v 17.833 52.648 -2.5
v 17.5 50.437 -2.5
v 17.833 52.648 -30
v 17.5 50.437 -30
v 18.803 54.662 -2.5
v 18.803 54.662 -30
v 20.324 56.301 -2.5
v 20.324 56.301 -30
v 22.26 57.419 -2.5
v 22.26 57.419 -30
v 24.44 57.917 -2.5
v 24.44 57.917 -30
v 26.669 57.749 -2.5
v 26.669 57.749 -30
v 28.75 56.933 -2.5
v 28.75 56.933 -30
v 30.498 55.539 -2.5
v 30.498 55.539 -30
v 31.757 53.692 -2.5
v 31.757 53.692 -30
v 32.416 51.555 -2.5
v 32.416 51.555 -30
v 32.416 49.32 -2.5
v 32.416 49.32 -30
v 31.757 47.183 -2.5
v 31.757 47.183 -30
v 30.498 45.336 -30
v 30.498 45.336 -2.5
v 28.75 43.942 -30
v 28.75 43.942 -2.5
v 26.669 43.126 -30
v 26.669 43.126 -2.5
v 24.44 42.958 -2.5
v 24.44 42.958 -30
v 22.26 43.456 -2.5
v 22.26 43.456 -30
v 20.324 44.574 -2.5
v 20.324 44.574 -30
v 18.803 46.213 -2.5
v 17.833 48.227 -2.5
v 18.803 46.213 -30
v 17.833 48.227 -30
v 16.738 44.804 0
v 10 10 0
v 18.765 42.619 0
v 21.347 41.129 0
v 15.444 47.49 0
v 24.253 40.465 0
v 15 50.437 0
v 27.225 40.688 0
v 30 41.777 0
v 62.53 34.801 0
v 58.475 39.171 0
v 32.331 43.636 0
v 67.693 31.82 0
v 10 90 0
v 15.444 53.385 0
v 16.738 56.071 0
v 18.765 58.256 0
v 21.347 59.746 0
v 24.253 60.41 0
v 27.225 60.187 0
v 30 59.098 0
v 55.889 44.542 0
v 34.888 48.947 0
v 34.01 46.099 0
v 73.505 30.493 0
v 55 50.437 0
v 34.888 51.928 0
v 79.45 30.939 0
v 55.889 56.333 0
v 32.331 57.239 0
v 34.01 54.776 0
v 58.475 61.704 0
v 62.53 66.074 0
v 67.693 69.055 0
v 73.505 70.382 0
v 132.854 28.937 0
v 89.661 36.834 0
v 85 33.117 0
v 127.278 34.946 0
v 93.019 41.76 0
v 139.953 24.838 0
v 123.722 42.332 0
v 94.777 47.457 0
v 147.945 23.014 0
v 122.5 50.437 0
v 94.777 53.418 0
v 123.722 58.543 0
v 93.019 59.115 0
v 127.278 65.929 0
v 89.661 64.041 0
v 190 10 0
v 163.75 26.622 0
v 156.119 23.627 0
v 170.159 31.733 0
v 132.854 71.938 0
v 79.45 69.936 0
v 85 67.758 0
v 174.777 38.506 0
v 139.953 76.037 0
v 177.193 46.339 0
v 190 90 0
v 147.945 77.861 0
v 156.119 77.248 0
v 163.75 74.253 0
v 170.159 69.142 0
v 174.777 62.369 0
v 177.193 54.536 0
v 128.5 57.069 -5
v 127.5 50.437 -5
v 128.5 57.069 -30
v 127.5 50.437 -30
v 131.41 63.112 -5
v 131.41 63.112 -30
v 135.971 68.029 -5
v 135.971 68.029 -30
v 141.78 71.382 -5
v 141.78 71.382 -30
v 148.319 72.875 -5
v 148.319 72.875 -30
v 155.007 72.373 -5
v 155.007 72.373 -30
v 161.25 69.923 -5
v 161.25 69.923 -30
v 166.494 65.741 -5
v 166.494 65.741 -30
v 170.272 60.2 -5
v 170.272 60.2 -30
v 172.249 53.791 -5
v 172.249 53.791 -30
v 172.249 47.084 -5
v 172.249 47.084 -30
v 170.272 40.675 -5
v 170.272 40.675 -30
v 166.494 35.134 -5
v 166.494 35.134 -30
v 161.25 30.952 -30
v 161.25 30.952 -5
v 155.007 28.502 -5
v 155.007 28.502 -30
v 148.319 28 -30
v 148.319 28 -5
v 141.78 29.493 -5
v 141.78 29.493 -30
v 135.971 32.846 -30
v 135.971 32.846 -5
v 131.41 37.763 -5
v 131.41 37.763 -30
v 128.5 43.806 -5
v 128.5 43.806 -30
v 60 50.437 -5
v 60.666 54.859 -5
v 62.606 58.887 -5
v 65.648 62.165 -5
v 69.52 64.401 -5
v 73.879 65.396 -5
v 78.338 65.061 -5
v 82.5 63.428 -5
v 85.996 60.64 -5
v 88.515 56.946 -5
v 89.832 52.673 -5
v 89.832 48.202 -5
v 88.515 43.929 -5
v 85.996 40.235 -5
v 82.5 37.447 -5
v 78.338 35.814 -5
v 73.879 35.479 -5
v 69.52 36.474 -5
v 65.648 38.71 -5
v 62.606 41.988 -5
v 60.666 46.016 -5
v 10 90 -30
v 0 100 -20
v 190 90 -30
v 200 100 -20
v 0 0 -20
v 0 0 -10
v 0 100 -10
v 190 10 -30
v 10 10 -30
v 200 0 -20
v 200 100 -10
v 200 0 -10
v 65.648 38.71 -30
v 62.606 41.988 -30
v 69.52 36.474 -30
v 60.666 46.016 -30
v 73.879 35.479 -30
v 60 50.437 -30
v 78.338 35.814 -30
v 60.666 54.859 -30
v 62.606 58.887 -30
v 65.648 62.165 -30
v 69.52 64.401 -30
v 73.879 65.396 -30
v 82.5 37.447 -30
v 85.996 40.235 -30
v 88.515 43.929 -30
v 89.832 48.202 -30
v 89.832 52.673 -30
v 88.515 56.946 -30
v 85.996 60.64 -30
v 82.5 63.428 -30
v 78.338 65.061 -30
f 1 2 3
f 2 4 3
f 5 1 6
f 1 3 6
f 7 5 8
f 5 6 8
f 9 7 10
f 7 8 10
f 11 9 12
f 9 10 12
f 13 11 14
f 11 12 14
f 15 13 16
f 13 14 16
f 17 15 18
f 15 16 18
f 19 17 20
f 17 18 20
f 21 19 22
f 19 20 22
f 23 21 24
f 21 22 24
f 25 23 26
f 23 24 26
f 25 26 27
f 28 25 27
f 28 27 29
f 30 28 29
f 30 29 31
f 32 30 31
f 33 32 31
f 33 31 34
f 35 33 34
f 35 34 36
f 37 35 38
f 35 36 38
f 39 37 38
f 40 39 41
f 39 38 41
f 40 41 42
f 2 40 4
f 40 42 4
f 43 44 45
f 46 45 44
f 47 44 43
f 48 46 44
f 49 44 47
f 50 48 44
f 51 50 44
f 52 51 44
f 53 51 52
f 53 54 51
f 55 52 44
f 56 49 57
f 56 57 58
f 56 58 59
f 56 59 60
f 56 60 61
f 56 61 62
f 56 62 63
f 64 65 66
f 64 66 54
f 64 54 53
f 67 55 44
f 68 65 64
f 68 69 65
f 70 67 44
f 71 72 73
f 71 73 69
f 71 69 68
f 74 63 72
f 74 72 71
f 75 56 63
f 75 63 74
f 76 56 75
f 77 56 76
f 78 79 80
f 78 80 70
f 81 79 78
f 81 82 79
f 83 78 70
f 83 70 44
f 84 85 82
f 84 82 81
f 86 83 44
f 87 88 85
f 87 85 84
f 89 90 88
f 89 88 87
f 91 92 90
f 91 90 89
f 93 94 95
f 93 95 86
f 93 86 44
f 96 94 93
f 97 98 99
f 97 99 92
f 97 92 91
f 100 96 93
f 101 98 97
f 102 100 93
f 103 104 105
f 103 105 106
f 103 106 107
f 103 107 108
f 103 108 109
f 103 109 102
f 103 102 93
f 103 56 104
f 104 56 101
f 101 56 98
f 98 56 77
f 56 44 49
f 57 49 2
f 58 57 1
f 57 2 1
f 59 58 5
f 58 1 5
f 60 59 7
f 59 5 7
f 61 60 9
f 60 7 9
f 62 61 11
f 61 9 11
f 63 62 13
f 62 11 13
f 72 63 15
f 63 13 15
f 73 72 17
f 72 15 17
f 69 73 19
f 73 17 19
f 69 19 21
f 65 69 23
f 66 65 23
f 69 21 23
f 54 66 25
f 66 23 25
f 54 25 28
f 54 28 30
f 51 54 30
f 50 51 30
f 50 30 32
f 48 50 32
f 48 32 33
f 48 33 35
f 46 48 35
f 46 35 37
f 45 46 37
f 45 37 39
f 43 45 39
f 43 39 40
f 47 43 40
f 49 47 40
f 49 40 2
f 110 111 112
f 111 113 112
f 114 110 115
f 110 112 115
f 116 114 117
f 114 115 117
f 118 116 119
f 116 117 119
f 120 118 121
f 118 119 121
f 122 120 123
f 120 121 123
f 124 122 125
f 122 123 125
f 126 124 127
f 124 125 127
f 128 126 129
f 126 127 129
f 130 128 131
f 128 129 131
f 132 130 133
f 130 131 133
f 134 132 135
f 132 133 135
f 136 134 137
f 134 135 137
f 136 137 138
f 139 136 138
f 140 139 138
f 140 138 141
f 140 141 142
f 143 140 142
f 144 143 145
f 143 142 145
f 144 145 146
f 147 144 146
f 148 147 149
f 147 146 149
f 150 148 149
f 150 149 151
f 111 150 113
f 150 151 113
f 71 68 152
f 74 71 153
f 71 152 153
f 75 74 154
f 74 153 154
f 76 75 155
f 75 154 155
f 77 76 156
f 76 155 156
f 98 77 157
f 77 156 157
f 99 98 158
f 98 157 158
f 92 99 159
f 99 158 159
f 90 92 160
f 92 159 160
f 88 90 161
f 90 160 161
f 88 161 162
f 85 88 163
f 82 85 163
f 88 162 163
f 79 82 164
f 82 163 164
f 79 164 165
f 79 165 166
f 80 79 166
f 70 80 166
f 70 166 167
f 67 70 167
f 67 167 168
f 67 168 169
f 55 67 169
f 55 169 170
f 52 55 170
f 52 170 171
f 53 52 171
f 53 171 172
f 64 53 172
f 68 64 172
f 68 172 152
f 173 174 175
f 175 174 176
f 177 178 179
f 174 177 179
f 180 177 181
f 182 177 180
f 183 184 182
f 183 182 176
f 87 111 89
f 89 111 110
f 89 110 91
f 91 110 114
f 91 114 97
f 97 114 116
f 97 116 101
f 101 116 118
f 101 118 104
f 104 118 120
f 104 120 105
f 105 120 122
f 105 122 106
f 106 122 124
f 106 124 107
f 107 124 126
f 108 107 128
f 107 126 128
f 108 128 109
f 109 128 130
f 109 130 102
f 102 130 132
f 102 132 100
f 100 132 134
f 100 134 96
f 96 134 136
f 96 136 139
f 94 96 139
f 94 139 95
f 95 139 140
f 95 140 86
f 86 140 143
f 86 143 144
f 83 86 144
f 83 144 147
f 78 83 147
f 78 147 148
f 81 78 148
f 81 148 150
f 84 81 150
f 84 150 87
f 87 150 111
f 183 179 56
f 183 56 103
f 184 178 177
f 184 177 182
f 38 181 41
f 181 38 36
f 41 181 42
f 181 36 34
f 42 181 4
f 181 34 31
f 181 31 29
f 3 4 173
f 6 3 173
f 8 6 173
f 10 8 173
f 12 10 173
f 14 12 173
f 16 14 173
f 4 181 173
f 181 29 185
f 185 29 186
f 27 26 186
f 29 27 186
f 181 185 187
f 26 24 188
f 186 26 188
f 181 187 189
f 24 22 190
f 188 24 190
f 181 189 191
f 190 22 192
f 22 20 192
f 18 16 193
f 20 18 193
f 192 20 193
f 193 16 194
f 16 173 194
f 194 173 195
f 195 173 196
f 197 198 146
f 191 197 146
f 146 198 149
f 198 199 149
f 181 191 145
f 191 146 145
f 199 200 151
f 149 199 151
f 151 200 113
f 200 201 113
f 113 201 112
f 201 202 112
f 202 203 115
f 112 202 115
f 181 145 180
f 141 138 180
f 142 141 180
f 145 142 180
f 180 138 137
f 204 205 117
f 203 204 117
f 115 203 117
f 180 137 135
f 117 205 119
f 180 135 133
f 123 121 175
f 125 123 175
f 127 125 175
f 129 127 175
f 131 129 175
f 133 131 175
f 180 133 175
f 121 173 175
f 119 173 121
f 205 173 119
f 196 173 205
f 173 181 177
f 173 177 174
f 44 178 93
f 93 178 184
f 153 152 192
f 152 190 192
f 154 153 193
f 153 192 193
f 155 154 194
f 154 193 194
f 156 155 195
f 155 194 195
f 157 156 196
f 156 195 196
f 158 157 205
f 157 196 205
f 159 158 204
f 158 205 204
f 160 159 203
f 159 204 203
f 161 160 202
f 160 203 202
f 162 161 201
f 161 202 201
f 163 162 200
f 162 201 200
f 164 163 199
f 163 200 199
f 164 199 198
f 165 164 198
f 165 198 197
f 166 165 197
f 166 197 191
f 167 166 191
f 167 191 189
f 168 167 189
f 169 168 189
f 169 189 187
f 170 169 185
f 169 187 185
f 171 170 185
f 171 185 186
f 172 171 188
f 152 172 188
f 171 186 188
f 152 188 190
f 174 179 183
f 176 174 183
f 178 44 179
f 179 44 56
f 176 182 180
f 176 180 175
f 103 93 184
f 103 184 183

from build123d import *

# Parameters (mm, degrees)
F0_W           = 200
F0_H           = 100
F1_DEPTH       = 30
F2_D           = 15
F2_CSINK_D     = 20
F2_CSINK_ANGLE = 90
F3_D           = 30
F3_CSINK_D     = 40
F3_CSINK_ANGLE = 90
F4_D           = 45
F4_CSINK_D     = 55
F4_CSINK_ANGLE = 90
F5_SIZE        = 10


with BuildPart() as f1:
    # F0 (on Top) → F1 (new body)
    with BuildSketch(Plane.XY):
        with Locations((100, 50)):
            Rectangle(F0_W, F0_H)
    extrude(amount=-F1_DEPTH)

    # F2 (through all)
    with Locations(Plane.XY):
        with Locations((25, 50.437499)):
            CounterSinkHole(F2_D / 2, F2_CSINK_D / 2, counter_sink_angle=F2_CSINK_ANGLE)

    # F3 (through all)
    with Locations(Plane.XY):
        with Locations((75, 50.437499)):
            CounterSinkHole(F3_D / 2, F3_CSINK_D / 2, counter_sink_angle=F3_CSINK_ANGLE)

    # F4 (through all)
    with Locations(Plane.XY):
        with Locations((150, 50.437499)):
            CounterSinkHole(F4_D / 2, F4_CSINK_D / 2, counter_sink_angle=F4_CSINK_ANGLE)

    # F5
    f5_edges = [f1.edges().sort_by_distance(p)[0] for p in [
        (200, 50, 0),
        (200, 50, -30),
        (0, 50, 0),
        (0, 50, -30),
        (100, 100, 0),
        (100, 100, -30),
        (100, 0, 0),
        (100, 0, -30),
    ]]
    chamfer(f5_edges, length=F5_SIZE)


solid = f1.part
